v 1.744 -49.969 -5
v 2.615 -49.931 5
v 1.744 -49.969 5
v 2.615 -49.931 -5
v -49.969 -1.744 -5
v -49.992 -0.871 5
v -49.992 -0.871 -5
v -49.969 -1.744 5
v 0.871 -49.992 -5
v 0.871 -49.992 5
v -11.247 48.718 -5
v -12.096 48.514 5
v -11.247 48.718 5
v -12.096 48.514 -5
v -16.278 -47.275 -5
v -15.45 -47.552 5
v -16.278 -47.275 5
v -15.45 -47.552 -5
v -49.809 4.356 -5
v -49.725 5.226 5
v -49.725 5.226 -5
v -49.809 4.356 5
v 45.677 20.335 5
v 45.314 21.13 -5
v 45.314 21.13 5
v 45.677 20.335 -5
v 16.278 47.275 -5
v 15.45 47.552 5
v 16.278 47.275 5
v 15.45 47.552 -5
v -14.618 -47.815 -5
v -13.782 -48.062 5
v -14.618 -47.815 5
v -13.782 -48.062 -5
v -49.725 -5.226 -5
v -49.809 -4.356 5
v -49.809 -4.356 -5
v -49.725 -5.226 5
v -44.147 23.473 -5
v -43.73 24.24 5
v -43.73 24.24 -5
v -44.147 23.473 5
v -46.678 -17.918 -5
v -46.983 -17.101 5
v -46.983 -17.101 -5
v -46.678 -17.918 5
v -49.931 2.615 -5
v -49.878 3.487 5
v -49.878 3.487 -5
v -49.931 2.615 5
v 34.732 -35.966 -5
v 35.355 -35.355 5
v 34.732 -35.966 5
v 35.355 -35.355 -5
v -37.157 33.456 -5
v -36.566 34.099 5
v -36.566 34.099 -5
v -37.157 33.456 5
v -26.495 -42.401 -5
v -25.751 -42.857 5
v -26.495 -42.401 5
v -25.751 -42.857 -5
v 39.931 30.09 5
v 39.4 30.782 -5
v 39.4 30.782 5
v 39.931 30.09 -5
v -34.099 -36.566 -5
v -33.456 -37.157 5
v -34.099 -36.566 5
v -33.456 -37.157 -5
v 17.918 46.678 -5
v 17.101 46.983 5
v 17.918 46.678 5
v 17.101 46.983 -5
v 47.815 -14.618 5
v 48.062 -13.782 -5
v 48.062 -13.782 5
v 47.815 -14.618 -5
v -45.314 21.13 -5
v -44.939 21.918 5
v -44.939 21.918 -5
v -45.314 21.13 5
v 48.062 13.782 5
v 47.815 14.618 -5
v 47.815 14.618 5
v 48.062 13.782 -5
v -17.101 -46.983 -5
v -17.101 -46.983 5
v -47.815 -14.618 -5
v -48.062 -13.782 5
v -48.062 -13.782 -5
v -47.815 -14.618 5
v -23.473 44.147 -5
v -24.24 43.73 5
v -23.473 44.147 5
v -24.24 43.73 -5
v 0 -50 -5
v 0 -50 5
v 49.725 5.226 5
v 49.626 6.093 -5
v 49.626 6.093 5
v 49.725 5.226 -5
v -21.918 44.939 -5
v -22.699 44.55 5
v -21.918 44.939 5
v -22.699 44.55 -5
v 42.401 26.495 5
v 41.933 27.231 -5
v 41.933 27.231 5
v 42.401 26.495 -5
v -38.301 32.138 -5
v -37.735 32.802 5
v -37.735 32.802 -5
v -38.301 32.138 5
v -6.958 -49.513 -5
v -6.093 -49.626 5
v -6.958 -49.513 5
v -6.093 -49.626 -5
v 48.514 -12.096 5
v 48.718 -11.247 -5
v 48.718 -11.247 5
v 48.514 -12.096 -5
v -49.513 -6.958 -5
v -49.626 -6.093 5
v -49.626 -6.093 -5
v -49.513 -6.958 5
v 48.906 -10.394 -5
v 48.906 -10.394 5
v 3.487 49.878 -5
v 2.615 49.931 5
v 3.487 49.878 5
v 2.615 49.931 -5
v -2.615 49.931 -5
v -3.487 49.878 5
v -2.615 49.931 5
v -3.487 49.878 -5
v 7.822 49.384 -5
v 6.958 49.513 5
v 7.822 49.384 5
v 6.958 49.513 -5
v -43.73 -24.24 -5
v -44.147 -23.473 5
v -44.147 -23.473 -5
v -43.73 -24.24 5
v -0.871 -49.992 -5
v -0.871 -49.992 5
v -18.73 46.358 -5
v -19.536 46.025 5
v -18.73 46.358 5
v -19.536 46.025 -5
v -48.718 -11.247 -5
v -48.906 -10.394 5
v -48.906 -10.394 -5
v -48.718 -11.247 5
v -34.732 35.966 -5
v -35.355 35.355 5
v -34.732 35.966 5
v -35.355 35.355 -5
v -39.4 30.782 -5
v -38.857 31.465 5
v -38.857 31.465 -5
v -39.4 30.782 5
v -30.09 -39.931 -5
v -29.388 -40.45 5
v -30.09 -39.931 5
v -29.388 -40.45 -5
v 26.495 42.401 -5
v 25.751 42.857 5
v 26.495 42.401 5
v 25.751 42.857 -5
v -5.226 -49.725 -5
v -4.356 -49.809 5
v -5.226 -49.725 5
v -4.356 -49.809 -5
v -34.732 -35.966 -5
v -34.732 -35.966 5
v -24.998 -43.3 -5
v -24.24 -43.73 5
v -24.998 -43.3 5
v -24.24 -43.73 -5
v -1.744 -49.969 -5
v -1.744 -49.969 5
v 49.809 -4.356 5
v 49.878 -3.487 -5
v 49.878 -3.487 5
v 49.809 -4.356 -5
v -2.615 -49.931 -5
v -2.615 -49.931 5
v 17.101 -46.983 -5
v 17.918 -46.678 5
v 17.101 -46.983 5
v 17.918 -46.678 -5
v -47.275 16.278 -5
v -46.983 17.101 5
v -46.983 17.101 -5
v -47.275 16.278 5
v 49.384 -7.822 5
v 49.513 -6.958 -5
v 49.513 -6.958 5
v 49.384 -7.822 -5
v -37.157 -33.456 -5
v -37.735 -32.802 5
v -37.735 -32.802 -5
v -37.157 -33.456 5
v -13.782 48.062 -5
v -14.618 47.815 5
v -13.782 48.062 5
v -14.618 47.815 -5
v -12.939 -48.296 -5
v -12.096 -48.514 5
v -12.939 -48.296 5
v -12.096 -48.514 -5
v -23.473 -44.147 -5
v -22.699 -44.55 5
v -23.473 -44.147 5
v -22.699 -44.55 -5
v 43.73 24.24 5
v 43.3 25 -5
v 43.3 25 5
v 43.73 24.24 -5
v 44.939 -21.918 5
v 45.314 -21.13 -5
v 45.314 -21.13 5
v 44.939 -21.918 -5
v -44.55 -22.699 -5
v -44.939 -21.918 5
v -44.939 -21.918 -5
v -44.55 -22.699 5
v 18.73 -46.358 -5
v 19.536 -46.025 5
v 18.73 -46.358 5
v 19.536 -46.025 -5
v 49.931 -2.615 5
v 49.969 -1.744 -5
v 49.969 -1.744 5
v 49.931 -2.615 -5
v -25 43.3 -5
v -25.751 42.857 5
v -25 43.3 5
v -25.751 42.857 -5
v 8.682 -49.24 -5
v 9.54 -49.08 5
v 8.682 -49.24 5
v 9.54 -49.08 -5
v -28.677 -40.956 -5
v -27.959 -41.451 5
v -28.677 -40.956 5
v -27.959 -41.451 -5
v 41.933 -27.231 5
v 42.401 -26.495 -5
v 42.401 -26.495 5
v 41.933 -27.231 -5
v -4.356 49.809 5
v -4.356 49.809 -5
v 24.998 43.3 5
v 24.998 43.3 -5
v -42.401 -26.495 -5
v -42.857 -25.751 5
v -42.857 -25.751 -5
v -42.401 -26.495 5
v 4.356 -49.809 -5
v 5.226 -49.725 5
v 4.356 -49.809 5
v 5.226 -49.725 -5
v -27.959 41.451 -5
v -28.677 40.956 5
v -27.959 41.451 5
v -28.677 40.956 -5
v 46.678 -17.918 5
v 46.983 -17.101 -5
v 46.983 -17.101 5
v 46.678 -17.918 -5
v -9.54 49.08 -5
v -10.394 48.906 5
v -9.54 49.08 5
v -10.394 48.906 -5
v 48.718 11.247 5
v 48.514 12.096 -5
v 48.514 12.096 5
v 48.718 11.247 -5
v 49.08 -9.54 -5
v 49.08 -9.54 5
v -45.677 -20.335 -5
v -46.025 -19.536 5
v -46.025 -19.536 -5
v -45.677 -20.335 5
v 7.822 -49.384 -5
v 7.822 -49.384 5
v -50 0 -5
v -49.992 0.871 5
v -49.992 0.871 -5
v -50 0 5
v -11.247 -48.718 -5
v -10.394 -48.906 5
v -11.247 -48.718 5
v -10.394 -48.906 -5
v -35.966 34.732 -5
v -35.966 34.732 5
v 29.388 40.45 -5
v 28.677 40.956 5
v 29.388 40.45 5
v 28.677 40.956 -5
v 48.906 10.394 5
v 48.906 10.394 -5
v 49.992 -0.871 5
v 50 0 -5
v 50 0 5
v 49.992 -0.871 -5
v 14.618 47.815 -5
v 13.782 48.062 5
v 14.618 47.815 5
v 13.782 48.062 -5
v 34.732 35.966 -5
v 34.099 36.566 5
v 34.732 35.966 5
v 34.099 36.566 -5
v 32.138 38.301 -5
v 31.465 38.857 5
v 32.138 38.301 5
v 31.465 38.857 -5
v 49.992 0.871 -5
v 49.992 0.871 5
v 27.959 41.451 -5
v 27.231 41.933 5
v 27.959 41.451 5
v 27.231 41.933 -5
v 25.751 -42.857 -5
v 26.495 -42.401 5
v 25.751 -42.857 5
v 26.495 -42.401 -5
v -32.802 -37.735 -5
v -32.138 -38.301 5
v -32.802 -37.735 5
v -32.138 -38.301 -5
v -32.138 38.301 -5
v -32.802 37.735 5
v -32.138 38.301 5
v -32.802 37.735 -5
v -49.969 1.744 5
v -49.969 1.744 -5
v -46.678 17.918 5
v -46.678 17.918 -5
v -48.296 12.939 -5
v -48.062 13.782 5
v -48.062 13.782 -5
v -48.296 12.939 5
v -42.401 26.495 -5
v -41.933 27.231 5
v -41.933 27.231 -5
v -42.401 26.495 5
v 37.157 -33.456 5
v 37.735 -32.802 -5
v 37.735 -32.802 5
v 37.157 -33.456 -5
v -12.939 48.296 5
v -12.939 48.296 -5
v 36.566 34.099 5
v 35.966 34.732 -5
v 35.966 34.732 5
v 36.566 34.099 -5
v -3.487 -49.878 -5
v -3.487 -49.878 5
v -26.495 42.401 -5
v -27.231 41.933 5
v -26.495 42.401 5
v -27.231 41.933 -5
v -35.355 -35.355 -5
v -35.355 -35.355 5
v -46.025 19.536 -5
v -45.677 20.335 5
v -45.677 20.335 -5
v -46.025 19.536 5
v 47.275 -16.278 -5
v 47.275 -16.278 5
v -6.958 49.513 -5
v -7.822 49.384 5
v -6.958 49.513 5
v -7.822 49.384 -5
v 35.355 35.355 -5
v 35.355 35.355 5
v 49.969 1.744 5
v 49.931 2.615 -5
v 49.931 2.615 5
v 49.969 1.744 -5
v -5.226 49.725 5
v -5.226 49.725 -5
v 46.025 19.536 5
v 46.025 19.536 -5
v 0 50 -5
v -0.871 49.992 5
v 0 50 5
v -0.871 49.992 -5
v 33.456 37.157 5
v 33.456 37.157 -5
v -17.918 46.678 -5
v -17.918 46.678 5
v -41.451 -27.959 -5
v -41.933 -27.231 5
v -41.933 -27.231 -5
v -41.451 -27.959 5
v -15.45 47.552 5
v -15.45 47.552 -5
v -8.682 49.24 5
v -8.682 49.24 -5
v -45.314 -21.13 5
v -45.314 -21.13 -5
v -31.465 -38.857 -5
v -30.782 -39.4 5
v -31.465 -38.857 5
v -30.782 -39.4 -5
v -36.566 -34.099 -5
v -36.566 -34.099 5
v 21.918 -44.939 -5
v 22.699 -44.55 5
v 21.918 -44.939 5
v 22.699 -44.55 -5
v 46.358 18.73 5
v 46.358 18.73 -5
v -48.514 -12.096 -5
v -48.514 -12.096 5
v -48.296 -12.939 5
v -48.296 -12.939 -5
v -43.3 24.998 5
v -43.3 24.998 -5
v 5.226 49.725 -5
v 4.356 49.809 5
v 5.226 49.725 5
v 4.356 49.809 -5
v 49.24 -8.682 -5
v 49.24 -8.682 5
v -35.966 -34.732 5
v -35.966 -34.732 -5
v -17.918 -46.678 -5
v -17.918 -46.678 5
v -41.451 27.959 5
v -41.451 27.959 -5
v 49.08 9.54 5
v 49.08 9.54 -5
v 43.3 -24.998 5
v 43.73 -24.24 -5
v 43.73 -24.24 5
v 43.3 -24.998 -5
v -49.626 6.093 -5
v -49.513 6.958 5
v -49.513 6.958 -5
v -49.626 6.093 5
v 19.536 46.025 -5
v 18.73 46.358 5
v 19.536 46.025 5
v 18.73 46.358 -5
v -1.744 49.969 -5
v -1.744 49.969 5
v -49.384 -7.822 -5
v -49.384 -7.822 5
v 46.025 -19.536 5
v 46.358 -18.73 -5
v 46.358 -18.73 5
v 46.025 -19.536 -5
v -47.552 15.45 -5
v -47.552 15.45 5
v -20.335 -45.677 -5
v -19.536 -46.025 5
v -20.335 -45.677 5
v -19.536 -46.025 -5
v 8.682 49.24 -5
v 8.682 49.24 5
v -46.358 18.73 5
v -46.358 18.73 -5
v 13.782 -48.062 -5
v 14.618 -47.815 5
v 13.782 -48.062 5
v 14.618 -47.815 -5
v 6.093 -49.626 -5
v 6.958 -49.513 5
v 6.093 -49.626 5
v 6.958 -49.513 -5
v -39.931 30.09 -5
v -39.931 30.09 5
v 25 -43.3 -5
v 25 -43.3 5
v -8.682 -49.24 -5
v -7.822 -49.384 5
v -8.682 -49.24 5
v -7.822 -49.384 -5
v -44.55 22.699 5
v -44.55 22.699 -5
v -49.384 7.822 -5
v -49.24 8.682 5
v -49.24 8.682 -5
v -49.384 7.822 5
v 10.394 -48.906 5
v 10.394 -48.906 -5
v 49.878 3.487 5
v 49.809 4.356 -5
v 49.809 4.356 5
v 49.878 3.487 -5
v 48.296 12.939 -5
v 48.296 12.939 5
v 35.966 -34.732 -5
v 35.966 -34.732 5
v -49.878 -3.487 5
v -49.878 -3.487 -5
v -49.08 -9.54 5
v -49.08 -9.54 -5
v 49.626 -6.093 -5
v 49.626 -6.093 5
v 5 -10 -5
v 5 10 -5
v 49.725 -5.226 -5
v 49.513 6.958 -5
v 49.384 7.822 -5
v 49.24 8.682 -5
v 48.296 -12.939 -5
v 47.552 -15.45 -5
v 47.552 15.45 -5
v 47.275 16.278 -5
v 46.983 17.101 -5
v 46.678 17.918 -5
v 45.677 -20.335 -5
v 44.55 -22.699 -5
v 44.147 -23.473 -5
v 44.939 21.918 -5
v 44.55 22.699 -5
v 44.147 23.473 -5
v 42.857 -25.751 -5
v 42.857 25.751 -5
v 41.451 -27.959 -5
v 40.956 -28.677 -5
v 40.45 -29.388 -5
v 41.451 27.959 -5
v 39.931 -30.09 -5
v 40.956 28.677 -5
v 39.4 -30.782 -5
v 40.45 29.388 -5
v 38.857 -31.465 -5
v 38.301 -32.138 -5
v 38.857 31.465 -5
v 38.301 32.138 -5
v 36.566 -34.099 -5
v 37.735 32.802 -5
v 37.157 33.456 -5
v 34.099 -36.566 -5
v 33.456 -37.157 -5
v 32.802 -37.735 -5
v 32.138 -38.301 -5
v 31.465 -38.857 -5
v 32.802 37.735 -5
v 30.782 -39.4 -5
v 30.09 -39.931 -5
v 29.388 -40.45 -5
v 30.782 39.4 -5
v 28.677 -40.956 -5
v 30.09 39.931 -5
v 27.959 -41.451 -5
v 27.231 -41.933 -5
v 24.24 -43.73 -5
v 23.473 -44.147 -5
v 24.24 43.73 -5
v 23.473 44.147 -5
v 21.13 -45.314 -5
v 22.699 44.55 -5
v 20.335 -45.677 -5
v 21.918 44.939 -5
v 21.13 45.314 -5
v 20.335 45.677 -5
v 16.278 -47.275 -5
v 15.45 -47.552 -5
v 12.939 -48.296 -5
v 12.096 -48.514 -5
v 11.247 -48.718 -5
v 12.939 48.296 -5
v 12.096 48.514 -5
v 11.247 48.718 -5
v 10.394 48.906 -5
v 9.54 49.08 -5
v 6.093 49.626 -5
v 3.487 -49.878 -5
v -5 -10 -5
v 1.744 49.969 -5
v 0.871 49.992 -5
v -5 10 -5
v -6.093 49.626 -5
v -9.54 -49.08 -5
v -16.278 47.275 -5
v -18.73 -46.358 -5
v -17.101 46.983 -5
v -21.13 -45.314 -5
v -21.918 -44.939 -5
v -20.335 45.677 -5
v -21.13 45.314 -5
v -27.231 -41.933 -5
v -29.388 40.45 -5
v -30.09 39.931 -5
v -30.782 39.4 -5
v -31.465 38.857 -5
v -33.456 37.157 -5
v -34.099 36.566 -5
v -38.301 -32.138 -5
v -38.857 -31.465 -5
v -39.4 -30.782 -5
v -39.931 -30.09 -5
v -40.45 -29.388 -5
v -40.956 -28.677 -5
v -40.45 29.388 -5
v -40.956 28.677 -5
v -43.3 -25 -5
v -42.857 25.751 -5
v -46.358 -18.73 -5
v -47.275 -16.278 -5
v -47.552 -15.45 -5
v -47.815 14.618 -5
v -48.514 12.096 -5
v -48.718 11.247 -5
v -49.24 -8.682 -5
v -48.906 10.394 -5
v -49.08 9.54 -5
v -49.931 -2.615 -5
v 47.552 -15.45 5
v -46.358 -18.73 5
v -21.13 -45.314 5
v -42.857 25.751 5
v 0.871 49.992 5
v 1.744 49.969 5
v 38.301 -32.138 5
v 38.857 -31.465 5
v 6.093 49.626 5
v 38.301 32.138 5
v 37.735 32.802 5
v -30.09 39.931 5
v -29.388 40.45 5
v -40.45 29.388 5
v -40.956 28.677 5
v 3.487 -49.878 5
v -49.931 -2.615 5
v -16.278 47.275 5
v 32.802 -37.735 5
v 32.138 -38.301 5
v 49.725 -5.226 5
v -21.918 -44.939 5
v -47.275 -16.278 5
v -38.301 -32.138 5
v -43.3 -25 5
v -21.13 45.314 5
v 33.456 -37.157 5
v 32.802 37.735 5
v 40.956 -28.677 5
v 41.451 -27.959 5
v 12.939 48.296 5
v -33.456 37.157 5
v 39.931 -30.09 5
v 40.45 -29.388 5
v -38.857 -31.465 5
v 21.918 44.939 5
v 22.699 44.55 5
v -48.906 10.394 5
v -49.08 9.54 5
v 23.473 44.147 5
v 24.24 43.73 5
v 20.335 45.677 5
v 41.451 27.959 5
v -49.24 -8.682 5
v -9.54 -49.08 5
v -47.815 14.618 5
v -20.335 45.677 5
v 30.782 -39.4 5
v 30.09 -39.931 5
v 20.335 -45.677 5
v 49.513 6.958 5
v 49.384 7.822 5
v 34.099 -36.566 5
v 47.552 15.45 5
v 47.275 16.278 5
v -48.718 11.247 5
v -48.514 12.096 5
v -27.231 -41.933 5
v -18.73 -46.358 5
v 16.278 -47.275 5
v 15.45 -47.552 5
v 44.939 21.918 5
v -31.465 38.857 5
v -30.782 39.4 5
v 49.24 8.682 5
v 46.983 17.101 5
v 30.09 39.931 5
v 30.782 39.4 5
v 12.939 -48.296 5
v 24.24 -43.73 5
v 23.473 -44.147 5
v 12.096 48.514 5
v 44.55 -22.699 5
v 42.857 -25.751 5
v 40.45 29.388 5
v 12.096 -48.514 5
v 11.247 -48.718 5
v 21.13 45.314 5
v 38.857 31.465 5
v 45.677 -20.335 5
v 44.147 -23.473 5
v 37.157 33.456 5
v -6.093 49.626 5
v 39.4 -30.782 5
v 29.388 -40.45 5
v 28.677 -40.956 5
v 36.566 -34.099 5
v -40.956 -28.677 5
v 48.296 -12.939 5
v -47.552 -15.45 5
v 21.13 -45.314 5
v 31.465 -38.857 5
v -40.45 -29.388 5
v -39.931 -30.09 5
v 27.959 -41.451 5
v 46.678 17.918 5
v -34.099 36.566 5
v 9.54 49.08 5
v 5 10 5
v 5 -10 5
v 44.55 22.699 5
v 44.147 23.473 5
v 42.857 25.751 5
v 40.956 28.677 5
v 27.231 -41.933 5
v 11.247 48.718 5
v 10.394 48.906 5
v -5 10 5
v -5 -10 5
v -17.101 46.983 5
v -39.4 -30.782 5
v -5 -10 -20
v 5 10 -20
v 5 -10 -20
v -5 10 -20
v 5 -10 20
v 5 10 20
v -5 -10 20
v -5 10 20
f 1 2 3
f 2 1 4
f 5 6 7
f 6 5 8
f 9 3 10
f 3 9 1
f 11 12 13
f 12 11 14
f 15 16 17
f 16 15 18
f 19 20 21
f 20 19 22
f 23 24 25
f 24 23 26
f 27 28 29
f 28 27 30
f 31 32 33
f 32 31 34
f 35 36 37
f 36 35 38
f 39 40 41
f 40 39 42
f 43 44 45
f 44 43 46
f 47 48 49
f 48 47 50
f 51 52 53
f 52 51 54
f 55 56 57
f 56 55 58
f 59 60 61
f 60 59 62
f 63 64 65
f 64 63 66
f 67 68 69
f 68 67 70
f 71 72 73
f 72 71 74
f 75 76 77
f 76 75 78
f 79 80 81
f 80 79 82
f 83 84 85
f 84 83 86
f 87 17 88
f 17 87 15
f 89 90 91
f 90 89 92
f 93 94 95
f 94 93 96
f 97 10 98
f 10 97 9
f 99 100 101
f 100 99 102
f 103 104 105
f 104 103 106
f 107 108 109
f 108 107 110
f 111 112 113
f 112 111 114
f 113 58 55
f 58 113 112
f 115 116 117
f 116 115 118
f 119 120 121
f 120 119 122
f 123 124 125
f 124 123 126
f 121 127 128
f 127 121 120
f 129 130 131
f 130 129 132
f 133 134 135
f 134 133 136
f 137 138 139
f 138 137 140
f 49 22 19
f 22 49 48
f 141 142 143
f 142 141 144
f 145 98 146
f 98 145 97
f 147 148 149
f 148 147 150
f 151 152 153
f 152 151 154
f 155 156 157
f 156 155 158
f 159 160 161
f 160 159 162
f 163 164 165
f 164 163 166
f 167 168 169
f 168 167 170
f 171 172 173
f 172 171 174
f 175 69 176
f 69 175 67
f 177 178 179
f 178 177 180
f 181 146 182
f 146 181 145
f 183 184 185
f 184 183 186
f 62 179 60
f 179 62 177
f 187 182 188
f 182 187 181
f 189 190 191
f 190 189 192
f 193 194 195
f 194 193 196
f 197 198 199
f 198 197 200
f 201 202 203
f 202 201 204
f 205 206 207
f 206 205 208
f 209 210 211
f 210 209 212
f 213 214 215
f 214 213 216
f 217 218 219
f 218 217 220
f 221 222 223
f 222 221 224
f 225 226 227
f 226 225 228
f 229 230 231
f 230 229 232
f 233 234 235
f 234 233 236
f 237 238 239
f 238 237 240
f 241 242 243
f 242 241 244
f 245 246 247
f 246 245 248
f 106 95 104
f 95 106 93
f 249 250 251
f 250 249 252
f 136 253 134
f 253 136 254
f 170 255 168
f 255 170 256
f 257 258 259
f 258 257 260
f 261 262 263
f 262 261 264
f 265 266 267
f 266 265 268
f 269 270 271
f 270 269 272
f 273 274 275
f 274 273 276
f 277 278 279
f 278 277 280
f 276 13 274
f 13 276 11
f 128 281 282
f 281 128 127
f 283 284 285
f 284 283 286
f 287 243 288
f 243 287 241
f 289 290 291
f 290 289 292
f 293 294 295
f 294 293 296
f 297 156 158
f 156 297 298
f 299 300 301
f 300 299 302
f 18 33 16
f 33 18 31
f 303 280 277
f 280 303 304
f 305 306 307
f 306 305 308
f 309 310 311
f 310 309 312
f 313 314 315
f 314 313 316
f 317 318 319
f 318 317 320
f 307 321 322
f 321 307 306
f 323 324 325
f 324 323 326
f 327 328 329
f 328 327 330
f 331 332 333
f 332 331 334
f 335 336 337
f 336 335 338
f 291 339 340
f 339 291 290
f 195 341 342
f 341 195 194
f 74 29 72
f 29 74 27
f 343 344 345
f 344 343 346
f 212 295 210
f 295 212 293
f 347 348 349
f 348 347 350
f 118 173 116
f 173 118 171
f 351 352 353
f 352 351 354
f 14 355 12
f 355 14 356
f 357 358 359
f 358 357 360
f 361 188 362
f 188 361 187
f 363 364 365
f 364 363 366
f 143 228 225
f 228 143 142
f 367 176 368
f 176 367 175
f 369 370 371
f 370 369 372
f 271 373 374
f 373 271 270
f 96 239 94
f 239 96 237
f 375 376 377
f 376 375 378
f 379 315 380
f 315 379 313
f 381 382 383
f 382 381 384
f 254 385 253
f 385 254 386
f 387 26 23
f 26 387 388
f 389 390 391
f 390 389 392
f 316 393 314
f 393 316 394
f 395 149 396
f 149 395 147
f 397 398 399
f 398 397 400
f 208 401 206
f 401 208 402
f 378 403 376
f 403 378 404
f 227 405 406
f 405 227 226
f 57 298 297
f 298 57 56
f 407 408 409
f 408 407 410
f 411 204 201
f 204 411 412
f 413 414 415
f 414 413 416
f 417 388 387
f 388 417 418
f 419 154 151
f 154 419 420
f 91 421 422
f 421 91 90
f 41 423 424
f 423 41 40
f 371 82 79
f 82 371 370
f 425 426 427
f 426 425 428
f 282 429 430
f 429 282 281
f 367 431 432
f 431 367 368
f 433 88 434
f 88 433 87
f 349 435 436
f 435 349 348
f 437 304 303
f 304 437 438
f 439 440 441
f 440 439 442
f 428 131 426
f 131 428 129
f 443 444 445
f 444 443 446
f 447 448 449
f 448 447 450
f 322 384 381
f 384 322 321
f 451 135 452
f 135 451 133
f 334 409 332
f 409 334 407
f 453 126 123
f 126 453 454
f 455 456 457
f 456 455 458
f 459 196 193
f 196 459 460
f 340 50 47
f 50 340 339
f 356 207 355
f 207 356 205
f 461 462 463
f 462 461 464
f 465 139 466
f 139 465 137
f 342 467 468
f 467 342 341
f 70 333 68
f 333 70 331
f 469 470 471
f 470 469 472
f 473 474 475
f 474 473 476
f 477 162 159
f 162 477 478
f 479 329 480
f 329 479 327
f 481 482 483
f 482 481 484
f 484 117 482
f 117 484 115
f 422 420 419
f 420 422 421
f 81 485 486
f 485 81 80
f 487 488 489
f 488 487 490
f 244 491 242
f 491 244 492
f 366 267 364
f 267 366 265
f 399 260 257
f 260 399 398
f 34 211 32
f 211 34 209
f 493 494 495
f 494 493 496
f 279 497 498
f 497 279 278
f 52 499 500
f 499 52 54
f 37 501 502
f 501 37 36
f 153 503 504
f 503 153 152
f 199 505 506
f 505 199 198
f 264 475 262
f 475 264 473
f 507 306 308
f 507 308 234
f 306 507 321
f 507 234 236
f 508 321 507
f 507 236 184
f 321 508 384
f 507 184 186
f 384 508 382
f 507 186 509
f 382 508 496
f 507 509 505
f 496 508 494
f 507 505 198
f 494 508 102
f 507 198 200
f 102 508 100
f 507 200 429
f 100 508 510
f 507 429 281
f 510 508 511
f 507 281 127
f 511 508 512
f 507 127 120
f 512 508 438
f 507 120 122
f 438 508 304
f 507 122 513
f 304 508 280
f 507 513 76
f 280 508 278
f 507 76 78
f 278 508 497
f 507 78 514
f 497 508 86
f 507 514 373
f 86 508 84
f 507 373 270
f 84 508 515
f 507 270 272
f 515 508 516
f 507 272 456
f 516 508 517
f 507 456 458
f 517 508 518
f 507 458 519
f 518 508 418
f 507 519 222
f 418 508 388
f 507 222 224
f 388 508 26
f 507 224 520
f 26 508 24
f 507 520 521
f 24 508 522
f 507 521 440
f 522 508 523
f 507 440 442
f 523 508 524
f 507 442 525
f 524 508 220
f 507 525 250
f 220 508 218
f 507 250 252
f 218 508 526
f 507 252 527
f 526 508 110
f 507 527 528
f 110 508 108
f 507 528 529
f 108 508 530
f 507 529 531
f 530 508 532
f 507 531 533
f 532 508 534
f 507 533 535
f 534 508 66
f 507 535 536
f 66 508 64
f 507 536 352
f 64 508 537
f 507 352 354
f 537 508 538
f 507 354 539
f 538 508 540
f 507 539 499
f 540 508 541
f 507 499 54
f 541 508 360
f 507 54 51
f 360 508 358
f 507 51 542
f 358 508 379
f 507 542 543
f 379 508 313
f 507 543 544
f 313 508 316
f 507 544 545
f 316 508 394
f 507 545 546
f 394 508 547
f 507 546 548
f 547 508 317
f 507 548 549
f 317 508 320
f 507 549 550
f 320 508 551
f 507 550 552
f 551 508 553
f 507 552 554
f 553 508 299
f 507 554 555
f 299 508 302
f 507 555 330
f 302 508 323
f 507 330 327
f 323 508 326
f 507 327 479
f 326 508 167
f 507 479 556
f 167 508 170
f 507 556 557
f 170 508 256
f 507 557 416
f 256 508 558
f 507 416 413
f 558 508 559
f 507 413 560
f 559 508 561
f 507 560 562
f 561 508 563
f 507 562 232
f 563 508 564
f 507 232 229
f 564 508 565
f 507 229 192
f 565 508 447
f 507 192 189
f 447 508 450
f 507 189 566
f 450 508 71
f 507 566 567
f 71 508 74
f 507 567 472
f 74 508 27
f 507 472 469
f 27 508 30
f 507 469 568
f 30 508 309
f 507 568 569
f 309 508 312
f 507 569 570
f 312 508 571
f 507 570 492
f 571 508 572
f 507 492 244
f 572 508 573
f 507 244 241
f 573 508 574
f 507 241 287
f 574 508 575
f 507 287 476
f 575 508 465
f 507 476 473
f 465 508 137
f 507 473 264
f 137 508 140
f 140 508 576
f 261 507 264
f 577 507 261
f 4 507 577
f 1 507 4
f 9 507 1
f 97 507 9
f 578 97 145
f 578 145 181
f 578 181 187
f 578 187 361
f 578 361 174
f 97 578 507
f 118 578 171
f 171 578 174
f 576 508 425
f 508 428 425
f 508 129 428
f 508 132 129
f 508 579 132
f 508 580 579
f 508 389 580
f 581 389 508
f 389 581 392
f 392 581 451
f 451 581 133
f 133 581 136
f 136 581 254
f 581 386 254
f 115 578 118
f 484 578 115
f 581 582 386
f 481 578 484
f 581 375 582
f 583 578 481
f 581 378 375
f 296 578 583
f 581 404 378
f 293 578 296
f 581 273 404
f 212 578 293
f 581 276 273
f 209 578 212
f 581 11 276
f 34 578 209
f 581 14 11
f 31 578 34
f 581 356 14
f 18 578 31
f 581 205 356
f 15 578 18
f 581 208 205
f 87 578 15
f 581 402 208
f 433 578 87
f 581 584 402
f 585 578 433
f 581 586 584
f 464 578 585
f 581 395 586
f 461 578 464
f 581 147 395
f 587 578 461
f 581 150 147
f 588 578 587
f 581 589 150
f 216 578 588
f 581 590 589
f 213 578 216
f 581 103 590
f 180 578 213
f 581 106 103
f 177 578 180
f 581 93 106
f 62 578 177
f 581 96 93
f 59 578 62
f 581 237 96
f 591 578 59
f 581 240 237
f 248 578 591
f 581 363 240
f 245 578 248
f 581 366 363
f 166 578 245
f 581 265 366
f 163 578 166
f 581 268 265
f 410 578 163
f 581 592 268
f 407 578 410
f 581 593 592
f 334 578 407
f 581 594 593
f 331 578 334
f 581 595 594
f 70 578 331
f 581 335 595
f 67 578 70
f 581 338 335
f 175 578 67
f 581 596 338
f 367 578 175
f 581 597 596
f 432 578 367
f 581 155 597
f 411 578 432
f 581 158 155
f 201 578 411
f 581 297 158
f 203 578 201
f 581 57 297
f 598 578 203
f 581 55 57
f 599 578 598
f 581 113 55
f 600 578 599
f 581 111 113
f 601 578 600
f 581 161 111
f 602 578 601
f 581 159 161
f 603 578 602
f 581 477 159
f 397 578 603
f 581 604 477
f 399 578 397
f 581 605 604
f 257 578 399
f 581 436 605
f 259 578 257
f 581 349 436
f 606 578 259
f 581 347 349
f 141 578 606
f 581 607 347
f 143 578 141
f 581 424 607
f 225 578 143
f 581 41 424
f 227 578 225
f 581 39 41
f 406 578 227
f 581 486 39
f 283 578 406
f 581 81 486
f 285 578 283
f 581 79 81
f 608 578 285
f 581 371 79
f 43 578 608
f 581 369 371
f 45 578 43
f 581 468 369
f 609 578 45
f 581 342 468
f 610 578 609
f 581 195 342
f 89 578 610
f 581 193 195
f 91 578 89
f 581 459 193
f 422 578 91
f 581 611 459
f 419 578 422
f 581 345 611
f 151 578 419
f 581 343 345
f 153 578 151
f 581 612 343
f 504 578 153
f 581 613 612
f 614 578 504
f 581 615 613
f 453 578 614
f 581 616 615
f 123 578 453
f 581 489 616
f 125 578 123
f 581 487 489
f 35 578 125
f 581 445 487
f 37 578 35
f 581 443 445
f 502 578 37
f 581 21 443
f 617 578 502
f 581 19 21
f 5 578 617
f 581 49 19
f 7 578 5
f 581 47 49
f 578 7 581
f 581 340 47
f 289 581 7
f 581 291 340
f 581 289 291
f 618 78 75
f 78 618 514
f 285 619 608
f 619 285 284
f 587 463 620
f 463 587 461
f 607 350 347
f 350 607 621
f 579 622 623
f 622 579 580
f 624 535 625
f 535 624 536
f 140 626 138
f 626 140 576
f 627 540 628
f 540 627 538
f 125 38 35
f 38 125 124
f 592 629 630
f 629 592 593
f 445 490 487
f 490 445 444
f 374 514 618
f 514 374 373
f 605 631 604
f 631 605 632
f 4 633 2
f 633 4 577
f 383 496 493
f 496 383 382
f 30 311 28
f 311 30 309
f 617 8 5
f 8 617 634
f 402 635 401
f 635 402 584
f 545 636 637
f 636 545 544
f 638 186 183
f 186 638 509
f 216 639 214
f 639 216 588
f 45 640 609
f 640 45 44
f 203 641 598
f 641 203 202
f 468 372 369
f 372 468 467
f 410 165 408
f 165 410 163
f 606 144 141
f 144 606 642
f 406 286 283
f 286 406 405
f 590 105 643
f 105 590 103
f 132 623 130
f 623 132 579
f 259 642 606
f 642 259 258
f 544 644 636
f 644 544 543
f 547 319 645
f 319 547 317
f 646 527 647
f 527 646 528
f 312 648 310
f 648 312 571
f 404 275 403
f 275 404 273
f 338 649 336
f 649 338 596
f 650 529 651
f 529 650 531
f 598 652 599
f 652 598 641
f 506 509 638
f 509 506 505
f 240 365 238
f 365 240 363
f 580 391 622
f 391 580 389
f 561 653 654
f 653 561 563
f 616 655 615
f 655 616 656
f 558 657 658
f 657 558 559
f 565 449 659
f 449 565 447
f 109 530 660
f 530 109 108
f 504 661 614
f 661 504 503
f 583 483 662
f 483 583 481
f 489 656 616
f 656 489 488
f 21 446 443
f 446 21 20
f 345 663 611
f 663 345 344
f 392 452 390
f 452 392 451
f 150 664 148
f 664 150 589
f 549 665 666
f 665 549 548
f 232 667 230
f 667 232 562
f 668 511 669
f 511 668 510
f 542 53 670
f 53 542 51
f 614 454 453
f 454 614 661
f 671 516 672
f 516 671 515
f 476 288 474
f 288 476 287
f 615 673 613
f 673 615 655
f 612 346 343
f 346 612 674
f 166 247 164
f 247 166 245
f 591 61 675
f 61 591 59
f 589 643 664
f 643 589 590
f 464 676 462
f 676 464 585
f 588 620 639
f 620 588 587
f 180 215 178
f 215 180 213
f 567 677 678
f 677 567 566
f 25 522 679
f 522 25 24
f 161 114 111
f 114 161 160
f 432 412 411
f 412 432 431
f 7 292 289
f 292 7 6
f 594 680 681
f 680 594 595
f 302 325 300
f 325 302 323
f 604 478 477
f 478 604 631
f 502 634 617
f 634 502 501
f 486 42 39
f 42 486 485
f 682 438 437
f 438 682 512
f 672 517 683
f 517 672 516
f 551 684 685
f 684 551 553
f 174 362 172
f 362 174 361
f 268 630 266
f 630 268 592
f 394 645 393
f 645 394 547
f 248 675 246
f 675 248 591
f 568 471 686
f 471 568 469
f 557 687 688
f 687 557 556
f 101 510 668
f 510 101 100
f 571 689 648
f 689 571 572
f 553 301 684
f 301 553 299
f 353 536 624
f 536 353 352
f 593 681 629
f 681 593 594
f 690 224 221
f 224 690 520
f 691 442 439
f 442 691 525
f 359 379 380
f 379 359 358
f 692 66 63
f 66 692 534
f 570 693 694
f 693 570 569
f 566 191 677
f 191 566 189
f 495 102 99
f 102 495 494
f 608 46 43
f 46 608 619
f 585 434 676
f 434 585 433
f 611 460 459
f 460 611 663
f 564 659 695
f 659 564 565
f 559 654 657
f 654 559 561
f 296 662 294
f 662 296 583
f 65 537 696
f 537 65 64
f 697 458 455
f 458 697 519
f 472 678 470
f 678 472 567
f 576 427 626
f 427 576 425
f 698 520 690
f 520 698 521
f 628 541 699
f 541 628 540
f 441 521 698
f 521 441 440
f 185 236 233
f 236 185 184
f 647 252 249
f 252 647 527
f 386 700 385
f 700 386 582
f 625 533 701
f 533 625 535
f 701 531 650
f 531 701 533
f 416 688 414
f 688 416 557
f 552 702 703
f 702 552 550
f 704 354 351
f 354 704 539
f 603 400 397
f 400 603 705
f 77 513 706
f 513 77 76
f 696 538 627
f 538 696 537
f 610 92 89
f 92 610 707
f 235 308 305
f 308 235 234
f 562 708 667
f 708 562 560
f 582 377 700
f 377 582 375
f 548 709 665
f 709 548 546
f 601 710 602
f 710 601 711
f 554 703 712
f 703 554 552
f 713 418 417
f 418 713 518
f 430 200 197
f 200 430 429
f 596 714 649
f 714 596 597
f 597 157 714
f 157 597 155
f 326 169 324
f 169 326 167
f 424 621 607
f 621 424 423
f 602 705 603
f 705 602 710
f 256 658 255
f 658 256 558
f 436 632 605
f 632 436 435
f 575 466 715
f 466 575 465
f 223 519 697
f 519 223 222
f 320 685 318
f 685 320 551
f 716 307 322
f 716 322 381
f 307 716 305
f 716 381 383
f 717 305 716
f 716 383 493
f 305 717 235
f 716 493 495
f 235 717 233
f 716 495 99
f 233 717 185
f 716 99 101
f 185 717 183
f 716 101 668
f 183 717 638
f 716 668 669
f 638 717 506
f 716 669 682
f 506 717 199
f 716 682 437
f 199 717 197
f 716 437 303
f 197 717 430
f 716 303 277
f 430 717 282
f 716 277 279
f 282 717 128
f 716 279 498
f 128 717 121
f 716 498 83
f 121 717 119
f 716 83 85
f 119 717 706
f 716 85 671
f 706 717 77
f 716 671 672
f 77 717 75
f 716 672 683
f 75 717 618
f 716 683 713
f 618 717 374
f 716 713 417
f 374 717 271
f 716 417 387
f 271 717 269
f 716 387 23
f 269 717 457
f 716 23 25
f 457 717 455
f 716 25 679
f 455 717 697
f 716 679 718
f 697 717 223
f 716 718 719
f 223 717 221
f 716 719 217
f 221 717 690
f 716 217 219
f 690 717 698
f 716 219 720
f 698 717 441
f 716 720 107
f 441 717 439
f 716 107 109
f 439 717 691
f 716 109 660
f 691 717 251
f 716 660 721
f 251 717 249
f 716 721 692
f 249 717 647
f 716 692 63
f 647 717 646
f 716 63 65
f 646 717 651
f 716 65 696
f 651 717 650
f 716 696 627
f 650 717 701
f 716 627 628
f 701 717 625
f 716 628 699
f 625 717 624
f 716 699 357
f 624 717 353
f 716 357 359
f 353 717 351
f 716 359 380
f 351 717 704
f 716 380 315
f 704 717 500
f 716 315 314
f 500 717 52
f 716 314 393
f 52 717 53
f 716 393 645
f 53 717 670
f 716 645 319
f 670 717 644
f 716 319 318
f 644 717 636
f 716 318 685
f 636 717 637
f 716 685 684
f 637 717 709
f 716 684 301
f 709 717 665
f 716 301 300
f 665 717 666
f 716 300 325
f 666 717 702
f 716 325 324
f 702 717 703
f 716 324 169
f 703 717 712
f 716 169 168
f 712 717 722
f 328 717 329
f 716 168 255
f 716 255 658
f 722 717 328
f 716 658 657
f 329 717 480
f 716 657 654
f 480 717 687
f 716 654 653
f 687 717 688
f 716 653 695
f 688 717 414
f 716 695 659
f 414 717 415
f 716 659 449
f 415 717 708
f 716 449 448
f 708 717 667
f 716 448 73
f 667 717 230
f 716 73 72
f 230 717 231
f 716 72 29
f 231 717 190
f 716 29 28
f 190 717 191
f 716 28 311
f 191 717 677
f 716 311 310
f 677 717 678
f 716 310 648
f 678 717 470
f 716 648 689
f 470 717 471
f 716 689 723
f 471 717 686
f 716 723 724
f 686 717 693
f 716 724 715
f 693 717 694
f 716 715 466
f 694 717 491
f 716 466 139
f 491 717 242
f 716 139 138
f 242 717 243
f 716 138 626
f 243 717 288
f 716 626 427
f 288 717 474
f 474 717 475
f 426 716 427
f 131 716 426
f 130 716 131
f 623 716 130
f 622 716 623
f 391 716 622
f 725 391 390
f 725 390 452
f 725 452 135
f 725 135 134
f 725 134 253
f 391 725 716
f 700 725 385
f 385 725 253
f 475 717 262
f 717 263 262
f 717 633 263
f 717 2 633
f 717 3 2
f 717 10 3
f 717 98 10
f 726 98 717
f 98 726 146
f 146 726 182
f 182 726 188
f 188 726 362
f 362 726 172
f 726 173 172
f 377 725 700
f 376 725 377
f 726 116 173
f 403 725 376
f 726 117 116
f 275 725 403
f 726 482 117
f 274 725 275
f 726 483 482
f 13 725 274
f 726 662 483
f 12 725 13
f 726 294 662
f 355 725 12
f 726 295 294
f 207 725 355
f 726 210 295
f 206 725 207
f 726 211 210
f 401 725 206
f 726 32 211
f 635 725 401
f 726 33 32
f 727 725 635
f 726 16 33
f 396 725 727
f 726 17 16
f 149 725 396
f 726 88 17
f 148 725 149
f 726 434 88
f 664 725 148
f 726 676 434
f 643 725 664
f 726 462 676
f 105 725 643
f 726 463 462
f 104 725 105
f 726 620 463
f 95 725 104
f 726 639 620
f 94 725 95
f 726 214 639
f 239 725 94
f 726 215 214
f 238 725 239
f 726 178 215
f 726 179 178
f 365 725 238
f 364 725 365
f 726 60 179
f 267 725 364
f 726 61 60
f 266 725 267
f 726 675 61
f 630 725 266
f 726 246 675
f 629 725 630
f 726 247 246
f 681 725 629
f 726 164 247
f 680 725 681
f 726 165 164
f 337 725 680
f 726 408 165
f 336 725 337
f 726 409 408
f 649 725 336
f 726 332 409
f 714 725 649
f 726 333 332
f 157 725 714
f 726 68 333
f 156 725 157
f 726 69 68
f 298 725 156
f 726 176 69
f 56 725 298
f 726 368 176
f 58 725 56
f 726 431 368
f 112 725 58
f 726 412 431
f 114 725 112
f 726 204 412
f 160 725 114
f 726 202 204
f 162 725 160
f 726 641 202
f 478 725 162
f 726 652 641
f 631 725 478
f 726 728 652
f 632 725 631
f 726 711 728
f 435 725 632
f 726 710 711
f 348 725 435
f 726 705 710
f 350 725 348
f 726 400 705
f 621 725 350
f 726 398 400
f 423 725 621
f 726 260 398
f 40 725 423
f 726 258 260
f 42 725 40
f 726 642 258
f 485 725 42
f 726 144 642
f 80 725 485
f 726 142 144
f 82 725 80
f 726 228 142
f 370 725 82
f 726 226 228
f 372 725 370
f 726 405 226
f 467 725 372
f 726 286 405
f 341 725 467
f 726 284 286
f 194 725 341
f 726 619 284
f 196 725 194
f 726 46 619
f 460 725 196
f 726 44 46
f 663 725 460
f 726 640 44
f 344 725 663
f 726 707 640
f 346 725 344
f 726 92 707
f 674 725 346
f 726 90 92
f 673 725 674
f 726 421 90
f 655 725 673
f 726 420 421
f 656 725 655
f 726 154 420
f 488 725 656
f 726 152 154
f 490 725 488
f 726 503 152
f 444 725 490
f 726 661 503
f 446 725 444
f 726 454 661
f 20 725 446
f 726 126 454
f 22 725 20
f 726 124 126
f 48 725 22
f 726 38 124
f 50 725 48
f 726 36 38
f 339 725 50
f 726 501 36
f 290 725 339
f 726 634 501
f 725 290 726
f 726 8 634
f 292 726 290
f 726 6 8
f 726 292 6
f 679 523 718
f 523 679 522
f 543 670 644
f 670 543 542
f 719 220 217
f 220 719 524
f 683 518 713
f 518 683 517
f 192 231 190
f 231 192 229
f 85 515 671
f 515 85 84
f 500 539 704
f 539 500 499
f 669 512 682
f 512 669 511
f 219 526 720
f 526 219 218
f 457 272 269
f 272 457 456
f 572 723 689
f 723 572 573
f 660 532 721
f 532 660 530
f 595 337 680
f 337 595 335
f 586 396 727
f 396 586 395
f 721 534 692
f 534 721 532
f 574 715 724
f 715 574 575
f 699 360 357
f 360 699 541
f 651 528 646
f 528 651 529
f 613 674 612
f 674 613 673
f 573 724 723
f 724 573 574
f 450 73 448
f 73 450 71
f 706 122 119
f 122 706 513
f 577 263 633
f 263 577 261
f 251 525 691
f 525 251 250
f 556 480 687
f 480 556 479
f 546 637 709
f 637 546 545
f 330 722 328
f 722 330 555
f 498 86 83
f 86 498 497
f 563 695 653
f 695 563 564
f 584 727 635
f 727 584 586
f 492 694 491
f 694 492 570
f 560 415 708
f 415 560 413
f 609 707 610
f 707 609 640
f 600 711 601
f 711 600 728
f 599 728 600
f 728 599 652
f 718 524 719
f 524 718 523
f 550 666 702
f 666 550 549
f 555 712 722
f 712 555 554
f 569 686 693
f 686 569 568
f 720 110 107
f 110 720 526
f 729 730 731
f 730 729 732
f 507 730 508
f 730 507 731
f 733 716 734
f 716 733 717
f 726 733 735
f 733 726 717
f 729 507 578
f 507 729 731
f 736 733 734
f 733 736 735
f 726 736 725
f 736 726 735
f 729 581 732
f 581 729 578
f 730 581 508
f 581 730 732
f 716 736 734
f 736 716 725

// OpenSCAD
union()
{
    linear_extrude(height = 10.0, twist = 0.0, scale = 1.0, slices = 1, center = true)
    {
        scale([100.0, 100.0])
        {
            M593();
        }
    }
    linear_extrude(height = 40.0, twist = 0.0, scale = 1.0, slices = 1, center = true)
    {
        scale([10.0, 20.0])
        {
            M5451();
        }
    }
}

module M593()
{
    polygon
    (
        points =
        [
            [0.5, 0.0], 
            [0.49992384757819563, 0.008726203218641756], 
            [0.4996954135095479, 0.017449748351250485], 
            [0.4993147673772869, 0.026167978121471914], 
            [0.4987820251299121, 0.03487823687206265], 
            [0.4980973490458728, 0.04357787137382909], 
            [0.49726094768413664, 0.05226423163382673], 
            [0.496273075820661, 0.06093467170257374], 
            [0.4951340343707852, 0.06958655048003272], 
            [0.4938441702975689, 0.07821723252011543], 
            [0.492403876506104, 0.08682408883346518], 
            [0.490813591723832, 0.09540449768827242], 
            [0.48907380036690284, 0.10395584540887966], 
            [0.4871850323926176, 0.1124755271719325], 
            [0.48514786313799824, 0.12096094779983387], 
            [0.48296291314453416, 0.1294095225512604], 
            [0.48063084796915945, 0.13781867790849958], 
            [0.4781523779815178, 0.14618585236136836], 
            [0.47552825814757677, 0.1545084971874737], 
            [0.4727592877996584, 0.16278407722857835], 
            [0.46984631039295416, 0.17101007166283438], 
            [0.46679021324860087, 0.17918397477265013], 
            [0.4635919272833937, 0.18730329670795604], 
            [0.46025242672622013, 0.1953655642446369], 
            [0.45677272882130043, 0.20336832153790008], 
            [0.45315389351832497, 0.21130913087034972], 
            [0.4493970231495835, 0.2191855733945387], 
            [0.44550326209418395, 0.22699524986977337], 
            [0.4414737964294635, 0.2347357813929454], 
            [0.43730985356969787, 0.24240481012316853], 
            [0.4330127018922193, 0.25], 
            [0.42858365035105617, 0.2575190374550271], 
            [0.424024048078213, 0.26495963211660245], 
            [0.419335283972712, 0.27231951750751354], 
            [0.41451878627752087, 0.2795964517353734], 
            [0.4095760221444959, 0.286788218175523], 
            [0.4045084971874737, 0.29389262614623657], 
            [0.3993177550236464, 0.30090751157602413], 
            [0.39400537680336095, 0.30783073766282915], 
            [0.38857298072848545, 0.31466019552491875], 
            [0.383022221559489, 0.3213938048432697], 
            [0.377354790111386, 0.32802951449525364], 
            [0.3715724127386971, 0.3345653031794291], 
            [0.36567685080958523, 0.34099918003124924], 
            [0.35966990016932554, 0.3473291852294987], 
            [0.3535533905932738, 0.35355339059327373], 
            [0.3473291852294986, 0.3596699001693256], 
            [0.34099918003124924, 0.36567685080958523], 
            [0.3345653031794291, 0.37157241273869707], 
            [0.32802951449525364, 0.377354790111386], 
            [0.3213938048432697, 0.383022221559489], 
            [0.31466019552491875, 0.3885729807284854], 
            [0.30783073766282915, 0.394005376803361], 
            [0.3009075115760242, 0.3993177550236464], 
            [0.29389262614623657, 0.4045084971874737], 
            [0.2867882181755231, 0.4095760221444959], 
            [0.2795964517353734, 0.41451878627752087], 
            [0.2723195175075136, 0.41933528397271197], 
            [0.26495963211660245, 0.424024048078213], 
            [0.2575190374550272, 0.4285836503510561], 
            [0.24999999999999994, 0.43301270189221935], 
            [0.24240481012316856, 0.43730985356969787], 
            [0.23473578139294543, 0.44147379642946344], 
            [0.2269952498697734, 0.4455032620941839], 
            [0.21918557339453873, 0.4493970231495835], 
            [0.21130913087034972, 0.45315389351832497], 
            [0.2033683215379001, 0.45677272882130043], 
            [0.19536556424463686, 0.4602524267262202], 
            [0.1873032967079561, 0.46359192728339366], 
            [0.17918397477265008, 0.46679021324860087], 
            [0.1710100716628344, 0.46984631039295416], 
            [0.16278407722857827, 0.4727592877996584], 
            [0.15450849718747373, 0.47552825814757677], 
            [0.14618585236136838, 0.4781523779815177], 
            [0.13781867790849958, 0.48063084796915945], 
            [0.12940952255126037, 0.48296291314453416], 
            [0.12096094779983384, 0.48514786313799824], 
            [0.11247552717193246, 0.4871850323926176], 
            [0.10395584540887962, 0.48907380036690284], 
            [0.09540449768827246, 0.490813591723832], 
            [0.08682408883346511, 0.49240387650610407], 
            [0.07821723252011546, 0.4938441702975689], 
            [0.06958655048003273, 0.4951340343707852], 
            [0.060934671702573745, 0.496273075820661], 
            [0.05226423163382673, 0.49726094768413664], 
            [0.04357787137382907, 0.4980973490458728], 
            [0.034878236872062617, 0.4987820251299121], 
            [0.026167978121471983, 0.4993147673772869], 
            [0.01744974835125043, 0.4996954135095479], 
            [0.0087262032186418, 0.49992384757819563], 
            [3.061616997868383E-17, 0.5], 
            [-0.008726203218641738, 0.49992384757819563], 
            [-0.01744974835125059, 0.4996954135095479], 
            [-0.02616797812147192, 0.4993147673772869], 
            [-0.034878236872062665, 0.4987820251299121], 
            [-0.04357787137382912, 0.4980973490458728], 
            [-0.052264231633826666, 0.4972609476841367], 
            [-0.06093467170257368, 0.49627307582066105], 
            [-0.06958655048003279, 0.4951340343707851], 
            [-0.07821723252011552, 0.49384417029756883], 
            [-0.08682408883346515, 0.492403876506104], 
            [-0.0954044976882724, 0.490813591723832], 
            [-0.10395584540887956, 0.48907380036690284], 
            [-0.11247552717193263, 0.48718503239261757], 
            [-0.12096094779983389, 0.48514786313799824], 
            [-0.12940952255126043, 0.48296291314453416], 
            [-0.13781867790849953, 0.48063084796915945], 
            [-0.14618585236136833, 0.4781523779815178], 
            [-0.15450849718747367, 0.4755282581475768], 
            [-0.1627840772285784, 0.47275928779965837], 
            [-0.17101007166283436, 0.4698463103929542], 
            [-0.17918397477265013, 0.46679021324860087], 
            [-0.18730329670795604, 0.4635919272833937], 
            [-0.1953655642446368, 0.4602524267262202], 
            [-0.20336832153790002, 0.4567727288213005], 
            [-0.21130913087034986, 0.4531538935183249], 
            [-0.21918557339453876, 0.44939702314958346], 
            [-0.22699524986977335, 0.44550326209418395], 
            [-0.23473578139294526, 0.44147379642946355], 
            [-0.2424048101231685, 0.4373098535696979], 
            [-0.2500000000000001, 0.43301270189221924], 
            [-0.25751903745502713, 0.42858365035105617], 
            [-0.2649596321166024, 0.42402404807821303], 
            [-0.27231951750751354, 0.41933528397271197], 
            [-0.27959645173537334, 0.41451878627752087], 
            [-0.2867882181755229, 0.409576022144496], 
            [-0.2938926261462365, 0.4045084971874737], 
            [-0.3009075115760242, 0.39931775502364636], 
            [-0.30783073766282915, 0.394005376803361], 
            [-0.31466019552491864, 0.3885729807284855], 
            [-0.3213938048432697, 0.383022221559489], 
            [-0.32802951449525375, 0.3773547901113859], 
            [-0.3345653031794291, 0.3715724127386971], 
            [-0.3409991800312492, 0.3656768508095853], 
            [-0.3473291852294987, 0.35966990016932554], 
            [-0.35355339059327373, 0.3535533905932738], 
            [-0.3596699001693255, 0.34732918522949874], 
            [-0.36567685080958523, 0.3409991800312493], 
            [-0.3715724127386972, 0.334565303179429], 
            [-0.377354790111386, 0.32802951449525364], 
            [-0.38302222155948895, 0.32139380484326974], 
            [-0.38857298072848545, 0.3146601955249187], 
            [-0.39400537680336106, 0.30783073766282903], 
            [-0.39931775502364647, 0.3009075115760241], 
            [-0.40450849718747367, 0.2938926261462366], 
            [-0.40957602214449595, 0.28678821817552297], 
            [-0.4145187862775208, 0.27959645173537345], 
            [-0.41933528397271197, 0.27231951750751365], 
            [-0.424024048078213, 0.26495963211660245], 
            [-0.4285836503510562, 0.257519037455027], 
            [-0.43301270189221935, 0.24999999999999997], 
            [-0.43730985356969787, 0.24240481012316858], 
            [-0.4414737964294635, 0.23473578139294535], 
            [-0.4455032620941839, 0.22699524986977343], 
            [-0.4493970231495835, 0.21918557339453865], 
            [-0.45315389351832497, 0.21130913087034975], 
            [-0.4567727288213005, 0.20336832153790002], 
            [-0.4602524267262202, 0.19536556424463689], 
            [-0.46359192728339366, 0.18730329670795612], 
            [-0.46679021324860087, 0.1791839747726501], 
            [-0.4698463103929542, 0.17101007166283425], 
            [-0.4727592877996584, 0.1627840772285783], 
            [-0.47552825814757677, 0.15450849718747375], 
            [-0.4781523779815177, 0.14618585236136852], 
            [-0.48063084796915945, 0.1378186779084996], 
            [-0.48296291314453416, 0.1294095225512603], 
            [-0.48514786313799824, 0.12096094779983387], 
            [-0.48718503239261757, 0.1124755271719326], 
            [-0.48907380036690284, 0.10395584540887966], 
            [-0.490813591723832, 0.09540449768827249], 
            [-0.492403876506104, 0.08682408883346514], 
            [-0.49384417029756883, 0.07821723252011549], 
            [-0.4951340343707852, 0.06958655048003266], 
            [-0.496273075820661, 0.06093467170257377], 
            [-0.49726094768413664, 0.05226423163382687], 
            [-0.4980973490458728, 0.0435778713738291], 
            [-0.49878202512991215, 0.03487823687206254], 
            [-0.4993147673772869, 0.026167978121471903], 
            [-0.4996954135095479, 0.01744974835125057], 
            [-0.49992384757819563, 0.00872620321864172], 
            [-0.5, 6.123233995736766E-17], 
            [-0.49992384757819563, -0.008726203218641596], 
            [-0.4996954135095479, -0.01744974835125045], 
            [-0.4993147673772869, -0.02616797812147178], 
            [-0.4987820251299121, -0.03487823687206286], 
            [-0.4980973490458728, -0.043577871373829194], 
            [-0.49726094768413664, -0.05226423163382675], 
            [-0.496273075820661, -0.06093467170257387], 
            [-0.4951340343707851, -0.06958655048003276], 
            [-0.4938441702975689, -0.07821723252011537], 
            [-0.492403876506104, -0.08682408883346523], 
            [-0.490813591723832, -0.09540449768827236], 
            [-0.48907380036690284, -0.10395584540887953], 
            [-0.4871850323926176, -0.11247552717193249], 
            [-0.48514786313799824, -0.12096094779983375], 
            [-0.4829629131445341, -0.1294095225512606], 
            [-0.4806308479691594, -0.13781867790849972], 
            [-0.4781523779815177, -0.14618585236136838], 
            [-0.47552825814757677, -0.15450849718747386], 
            [-0.47275928779965837, -0.16278407722857838], 
            [-0.4698463103929542, -0.17101007166283433], 
            [-0.46679021324860087, -0.17918397477265022], 
            [-0.4635919272833937, -0.187303296707956], 
            [-0.4602524267262202, -0.19536556424463677], 
            [-0.45677272882130054, -0.2033683215378999], 
            [-0.453153893518325, -0.21130913087034964], 
            [-0.4493970231495834, -0.21918557339453892], 
            [-0.44550326209418384, -0.22699524986977354], 
            [-0.44147379642946344, -0.23473578139294543], 
            [-0.4373098535696978, -0.24240481012316867], 
            [-0.4330127018922193, -0.25000000000000006], 
            [-0.42858365035105617, -0.2575190374550271], 
            [-0.42402404807821303, -0.2649596321166024], 
            [-0.419335283972712, -0.27231951750751354], 
            [-0.4145187862775209, -0.27959645173537334], 
            [-0.409576022144496, -0.2867882181755229], 
            [-0.4045084971874738, -0.2938926261462365], 
            [-0.3993177550236465, -0.300907511576024], 
            [-0.3940053768033609, -0.30783073766282926], 
            [-0.3885729807284854, -0.3146601955249188], 
            [-0.383022221559489, -0.3213938048432696], 
            [-0.37735479011138595, -0.3280295144952537], 
            [-0.3715724127386971, -0.3345653031794291], 
            [-0.3656768508095853, -0.3409991800312492], 
            [-0.35966990016932554, -0.3473291852294987], 
            [-0.35355339059327384, -0.35355339059327373], 
            [-0.3473291852294988, -0.35966990016932543], 
            [-0.3409991800312493, -0.36567685080958523], 
            [-0.33456530317942923, -0.371572412738697], 
            [-0.32802951449525347, -0.3773547901113861], 
            [-0.3213938048432694, -0.38302222155948923], 
            [-0.3146601955249186, -0.38857298072848556], 
            [-0.30783073766282903, -0.39400537680336106], 
            [-0.30090751157602413, -0.3993177550236464], 
            [-0.2938926261462366, -0.40450849718747367], 
            [-0.2867882181755232, -0.4095760221444958], 
            [-0.2795964517353736, -0.4145187862775207], 
            [-0.2723195175075135, -0.419335283972712], 
            [-0.2649596321166025, -0.424024048078213], 
            [-0.25751903745502724, -0.42858365035105606], 
            [-0.2499999999999998, -0.4330127018922194], 
            [-0.24240481012316842, -0.437309853569698], 
            [-0.23473578139294538, -0.4414737964294635], 
            [-0.22699524986977346, -0.4455032620941839], 
            [-0.21918557339453887, -0.4493970231495834], 
            [-0.21130913087034958, -0.453153893518325], 
            [-0.20336832153790005, -0.4567727288213005], 
            [-0.1953655642446369, -0.46025242672622013], 
            [-0.18730329670795615, -0.46359192728339366], 
            [-0.17918397477265036, -0.4667902132486008], 
            [-0.1710100716628347, -0.4698463103929541], 
            [-0.16278407722857832, -0.4727592877996584], 
            [-0.15450849718747378, -0.47552825814757677], 
            [-0.1461858523613681, -0.47815237798151783], 
            [-0.13781867790849944, -0.4806308479691595], 
            [-0.12940952255126031, -0.48296291314453416], 
            [-0.12096094779983389, -0.48514786313799824], 
            [-0.11247552717193263, -0.48718503239261757], 
            [-0.1039558454088799, -0.4890738003669028], 
            [-0.0954044976882723, -0.490813591723832], 
            [-0.08682408883346517, -0.492403876506104], 
            [-0.07821723252011552, -0.49384417029756883], 
            [-0.06958655048003247, -0.4951340343707852], 
            [-0.060934671702573585, -0.49627307582066105], 
            [-0.05226423163382668, -0.4972609476841367], 
            [-0.043577871373829125, -0.4980973490458728], 
            [-0.03487823687206279, -0.4987820251299121], 
            [-0.026167978121471713, -0.49931476737728697], 
            [-0.01744974835125038, -0.4996954135095479], 
            [-0.008726203218641749, -0.49992384757819563], 
            [-9.184850993605148E-17, -0.5], 
            [0.008726203218641565, -0.49992384757819563], 
            [0.017449748351250197, -0.4996954135095479], 
            [0.026167978121471973, -0.4993147673772869], 
            [0.03487823687206261, -0.49878202512991215], 
            [0.04357787137382939, -0.4980973490458727], 
            [0.05226423163382694, -0.49726094768413664], 
            [0.06093467170257384, -0.496273075820661], 
            [0.06958655048003273, -0.4951340343707852], 
            [0.07821723252011534, -0.4938441702975689], 
            [0.08682408883346499, -0.49240387650610407], 
            [0.09540449768827212, -0.49081359172383204], 
            [0.10395584540887971, -0.4890738003669028], 
            [0.11247552717193246, -0.4871850323926176], 
            [0.12096094779983416, -0.4851478631379982], 
            [0.12940952255126056, -0.4829629131445341], 
            [0.1378186779084997, -0.4806308479691594], 
            [0.14618585236136836, -0.4781523779815177], 
            [0.15450849718747361, -0.4755282581475768], 
            [0.16278407722857816, -0.4727592877996585], 
            [0.1710100716628345, -0.46984631039295416], 
            [0.1791839747726502, -0.46679021324860087], 
            [0.18730329670795598, -0.4635919272833937], 
            [0.19536556424463675, -0.46025242672622024], 
            [0.20336832153789988, -0.45677272882130054], 
            [0.2113091308703498, -0.45315389351832497], 
            [0.2191855733945387, -0.4493970231495835], 
            [0.22699524986977332, -0.44550326209418395], 
            [0.2347357813929456, -0.4414737964294634], 
            [0.24240481012316864, -0.4373098535696978], 
            [0.25000000000000006, -0.4330127018922193], 
            [0.2575190374550271, -0.42858365035105617], 
            [0.26495963211660234, -0.4240240480782131], 
            [0.2723195175075133, -0.41933528397271214], 
            [0.2795964517353735, -0.4145187862775208], 
            [0.286788218175523, -0.4095760221444959], 
            [0.29389262614623646, -0.4045084971874738], 
            [0.30090751157602436, -0.3993177550236463], 
            [0.30783073766282926, -0.3940053768033609], 
            [0.31466019552491875, -0.3885729807284854], 
            [0.3213938048432696, -0.38302222155948906], 
            [0.3280295144952535, -0.3773547901113861], 
            [0.33456530317942923, -0.371572412738697], 
            [0.3409991800312493, -0.3656768508095852], 
            [0.3473291852294986, -0.3596699001693256], 
            [0.3535533905932737, -0.35355339059327384], 
            [0.35966990016932543, -0.3473291852294988], 
            [0.365676850809585, -0.34099918003124946], 
            [0.3715724127386971, -0.33456530317942906], 
            [0.37735479011138595, -0.3280295144952537], 
            [0.38302222155948923, -0.32139380484326946], 
            [0.38857298072848556, -0.3146601955249186], 
            [0.394005376803361, -0.3078307376628291], 
            [0.3993177550236464, -0.30090751157602413], 
            [0.40450849718747367, -0.2938926261462367], 
            [0.4095760221444958, -0.28678821817552325], 
            [0.4145187862775207, -0.2795964517353737], 
            [0.419335283972712, -0.2723195175075135], 
            [0.424024048078213, -0.2649596321166025], 
            [0.4285836503510563, -0.25751903745502686], 
            [0.4330127018922194, -0.24999999999999983], 
            [0.4373098535696979, -0.24240481012316845], 
            [0.44147379642946344, -0.2347357813929454], 
            [0.4455032620941839, -0.22699524986977349], 
            [0.4493970231495834, -0.2191855733945389], 
            [0.453153893518325, -0.2113091308703496], 
            [0.4567727288213005, -0.20336832153790008], 
            [0.46025242672622013, -0.19536556424463694], 
            [0.46359192728339366, -0.18730329670795617], 
            [0.46679021324860076, -0.17918397477265038], 
            [0.4698463103929542, -0.1710100716628343], 
            [0.4727592877996584, -0.16278407722857835], 
            [0.47552825814757677, -0.1545084971874738], 
            [0.47815237798151783, -0.14618585236136813], 
            [0.48063084796915945, -0.13781867790849947], 
            [0.48296291314453416, -0.12940952255126034], 
            [0.48514786313799824, -0.12096094779983393], 
            [0.48718503239261757, -0.11247552717193267], 
            [0.4890738003669028, -0.10395584540887993], 
            [0.490813591723832, -0.09540449768827233], 
            [0.492403876506104, -0.0868240888334652], 
            [0.49384417029756894, -0.07821723252011512], 
            [0.4951340343707852, -0.0695865504800325], 
            [0.49627307582066105, -0.06093467170257361], 
            [0.49726094768413664, -0.05226423163382671], 
            [0.4980973490458728, -0.04357787137382916], 
            [0.4987820251299121, -0.03487823687206282], 
            [0.49931476737728697, -0.02616797812147174], 
            [0.4996954135095479, -0.017449748351250412], 
            [0.49992384757819563, -0.00872620321864178]
        ],
        paths =
        [
            [0, 1, 2, 3, 4, 5, 6, 7, 8, 9, 10, 11, 12, 13, 14, 15, 16, 17, 18, 19, 20, 21, 22, 23, 24, 25, 26, 27, 28, 29, 30, 31, 32, 33, 34, 35, 36, 37, 38, 39, 40, 41, 42, 43, 44, 45, 46, 47, 48, 49, 50, 51, 52, 53, 54, 55, 56, 57, 58, 59, 60, 61, 62, 63, 64, 65, 66, 67, 68, 69, 70, 71, 72, 73, 74, 75, 76, 77, 78, 79, 80, 81, 82, 83, 84, 85, 86, 87, 88, 89, 90, 91, 92, 93, 94, 95, 96, 97, 98, 99, 100, 101, 102, 103, 104, 105, 106, 107, 108, 109, 110, 111, 112, 113, 114, 115, 116, 117, 118, 119, 120, 121, 122, 123, 124, 125, 126, 127, 128, 129, 130, 131, 132, 133, 134, 135, 136, 137, 138, 139, 140, 141, 142, 143, 144, 145, 146, 147, 148, 149, 150, 151, 152, 153, 154, 155, 156, 157, 158, 159, 160, 161, 162, 163, 164, 165, 166, 167, 168, 169, 170, 171, 172, 173, 174, 175, 176, 177, 178, 179, 180, 181, 182, 183, 184, 185, 186, 187, 188, 189, 190, 191, 192, 193, 194, 195, 196, 197, 198, 199, 200, 201, 202, 203, 204, 205, 206, 207, 208, 209, 210, 211, 212, 213, 214, 215, 216, 217, 218, 219, 220, 221, 222, 223, 224, 225, 226, 227, 228, 229, 230, 231, 232, 233, 234, 235, 236, 237, 238, 239, 240, 241, 242, 243, 244, 245, 246, 247, 248, 249, 250, 251, 252, 253, 254, 255, 256, 257, 258, 259, 260, 261, 262, 263, 264, 265, 266, 267, 268, 269, 270, 271, 272, 273, 274, 275, 276, 277, 278, 279, 280, 281, 282, 283, 284, 285, 286, 287, 288, 289, 290, 291, 292, 293, 294, 295, 296, 297, 298, 299, 300, 301, 302, 303, 304, 305, 306, 307, 308, 309, 310, 311, 312, 313, 314, 315, 316, 317, 318, 319, 320, 321, 322, 323, 324, 325, 326, 327, 328, 329, 330, 331, 332, 333, 334, 335, 336, 337, 338, 339, 340, 341, 342, 343, 344, 345, 346, 347, 348, 349, 350, 351, 352, 353, 354, 355, 356, 357, 358, 359]
        ]
    );
}

module M5451()
{
    polygon
    (
        points =
        [
            [-0.5, -0.5], 
            [0.5, -0.5], 
            [0.5, 0.5], 
            [-0.5, 0.5]
        ],
        paths =
        [
            [0, 1, 2, 3]
        ]
    );
}
